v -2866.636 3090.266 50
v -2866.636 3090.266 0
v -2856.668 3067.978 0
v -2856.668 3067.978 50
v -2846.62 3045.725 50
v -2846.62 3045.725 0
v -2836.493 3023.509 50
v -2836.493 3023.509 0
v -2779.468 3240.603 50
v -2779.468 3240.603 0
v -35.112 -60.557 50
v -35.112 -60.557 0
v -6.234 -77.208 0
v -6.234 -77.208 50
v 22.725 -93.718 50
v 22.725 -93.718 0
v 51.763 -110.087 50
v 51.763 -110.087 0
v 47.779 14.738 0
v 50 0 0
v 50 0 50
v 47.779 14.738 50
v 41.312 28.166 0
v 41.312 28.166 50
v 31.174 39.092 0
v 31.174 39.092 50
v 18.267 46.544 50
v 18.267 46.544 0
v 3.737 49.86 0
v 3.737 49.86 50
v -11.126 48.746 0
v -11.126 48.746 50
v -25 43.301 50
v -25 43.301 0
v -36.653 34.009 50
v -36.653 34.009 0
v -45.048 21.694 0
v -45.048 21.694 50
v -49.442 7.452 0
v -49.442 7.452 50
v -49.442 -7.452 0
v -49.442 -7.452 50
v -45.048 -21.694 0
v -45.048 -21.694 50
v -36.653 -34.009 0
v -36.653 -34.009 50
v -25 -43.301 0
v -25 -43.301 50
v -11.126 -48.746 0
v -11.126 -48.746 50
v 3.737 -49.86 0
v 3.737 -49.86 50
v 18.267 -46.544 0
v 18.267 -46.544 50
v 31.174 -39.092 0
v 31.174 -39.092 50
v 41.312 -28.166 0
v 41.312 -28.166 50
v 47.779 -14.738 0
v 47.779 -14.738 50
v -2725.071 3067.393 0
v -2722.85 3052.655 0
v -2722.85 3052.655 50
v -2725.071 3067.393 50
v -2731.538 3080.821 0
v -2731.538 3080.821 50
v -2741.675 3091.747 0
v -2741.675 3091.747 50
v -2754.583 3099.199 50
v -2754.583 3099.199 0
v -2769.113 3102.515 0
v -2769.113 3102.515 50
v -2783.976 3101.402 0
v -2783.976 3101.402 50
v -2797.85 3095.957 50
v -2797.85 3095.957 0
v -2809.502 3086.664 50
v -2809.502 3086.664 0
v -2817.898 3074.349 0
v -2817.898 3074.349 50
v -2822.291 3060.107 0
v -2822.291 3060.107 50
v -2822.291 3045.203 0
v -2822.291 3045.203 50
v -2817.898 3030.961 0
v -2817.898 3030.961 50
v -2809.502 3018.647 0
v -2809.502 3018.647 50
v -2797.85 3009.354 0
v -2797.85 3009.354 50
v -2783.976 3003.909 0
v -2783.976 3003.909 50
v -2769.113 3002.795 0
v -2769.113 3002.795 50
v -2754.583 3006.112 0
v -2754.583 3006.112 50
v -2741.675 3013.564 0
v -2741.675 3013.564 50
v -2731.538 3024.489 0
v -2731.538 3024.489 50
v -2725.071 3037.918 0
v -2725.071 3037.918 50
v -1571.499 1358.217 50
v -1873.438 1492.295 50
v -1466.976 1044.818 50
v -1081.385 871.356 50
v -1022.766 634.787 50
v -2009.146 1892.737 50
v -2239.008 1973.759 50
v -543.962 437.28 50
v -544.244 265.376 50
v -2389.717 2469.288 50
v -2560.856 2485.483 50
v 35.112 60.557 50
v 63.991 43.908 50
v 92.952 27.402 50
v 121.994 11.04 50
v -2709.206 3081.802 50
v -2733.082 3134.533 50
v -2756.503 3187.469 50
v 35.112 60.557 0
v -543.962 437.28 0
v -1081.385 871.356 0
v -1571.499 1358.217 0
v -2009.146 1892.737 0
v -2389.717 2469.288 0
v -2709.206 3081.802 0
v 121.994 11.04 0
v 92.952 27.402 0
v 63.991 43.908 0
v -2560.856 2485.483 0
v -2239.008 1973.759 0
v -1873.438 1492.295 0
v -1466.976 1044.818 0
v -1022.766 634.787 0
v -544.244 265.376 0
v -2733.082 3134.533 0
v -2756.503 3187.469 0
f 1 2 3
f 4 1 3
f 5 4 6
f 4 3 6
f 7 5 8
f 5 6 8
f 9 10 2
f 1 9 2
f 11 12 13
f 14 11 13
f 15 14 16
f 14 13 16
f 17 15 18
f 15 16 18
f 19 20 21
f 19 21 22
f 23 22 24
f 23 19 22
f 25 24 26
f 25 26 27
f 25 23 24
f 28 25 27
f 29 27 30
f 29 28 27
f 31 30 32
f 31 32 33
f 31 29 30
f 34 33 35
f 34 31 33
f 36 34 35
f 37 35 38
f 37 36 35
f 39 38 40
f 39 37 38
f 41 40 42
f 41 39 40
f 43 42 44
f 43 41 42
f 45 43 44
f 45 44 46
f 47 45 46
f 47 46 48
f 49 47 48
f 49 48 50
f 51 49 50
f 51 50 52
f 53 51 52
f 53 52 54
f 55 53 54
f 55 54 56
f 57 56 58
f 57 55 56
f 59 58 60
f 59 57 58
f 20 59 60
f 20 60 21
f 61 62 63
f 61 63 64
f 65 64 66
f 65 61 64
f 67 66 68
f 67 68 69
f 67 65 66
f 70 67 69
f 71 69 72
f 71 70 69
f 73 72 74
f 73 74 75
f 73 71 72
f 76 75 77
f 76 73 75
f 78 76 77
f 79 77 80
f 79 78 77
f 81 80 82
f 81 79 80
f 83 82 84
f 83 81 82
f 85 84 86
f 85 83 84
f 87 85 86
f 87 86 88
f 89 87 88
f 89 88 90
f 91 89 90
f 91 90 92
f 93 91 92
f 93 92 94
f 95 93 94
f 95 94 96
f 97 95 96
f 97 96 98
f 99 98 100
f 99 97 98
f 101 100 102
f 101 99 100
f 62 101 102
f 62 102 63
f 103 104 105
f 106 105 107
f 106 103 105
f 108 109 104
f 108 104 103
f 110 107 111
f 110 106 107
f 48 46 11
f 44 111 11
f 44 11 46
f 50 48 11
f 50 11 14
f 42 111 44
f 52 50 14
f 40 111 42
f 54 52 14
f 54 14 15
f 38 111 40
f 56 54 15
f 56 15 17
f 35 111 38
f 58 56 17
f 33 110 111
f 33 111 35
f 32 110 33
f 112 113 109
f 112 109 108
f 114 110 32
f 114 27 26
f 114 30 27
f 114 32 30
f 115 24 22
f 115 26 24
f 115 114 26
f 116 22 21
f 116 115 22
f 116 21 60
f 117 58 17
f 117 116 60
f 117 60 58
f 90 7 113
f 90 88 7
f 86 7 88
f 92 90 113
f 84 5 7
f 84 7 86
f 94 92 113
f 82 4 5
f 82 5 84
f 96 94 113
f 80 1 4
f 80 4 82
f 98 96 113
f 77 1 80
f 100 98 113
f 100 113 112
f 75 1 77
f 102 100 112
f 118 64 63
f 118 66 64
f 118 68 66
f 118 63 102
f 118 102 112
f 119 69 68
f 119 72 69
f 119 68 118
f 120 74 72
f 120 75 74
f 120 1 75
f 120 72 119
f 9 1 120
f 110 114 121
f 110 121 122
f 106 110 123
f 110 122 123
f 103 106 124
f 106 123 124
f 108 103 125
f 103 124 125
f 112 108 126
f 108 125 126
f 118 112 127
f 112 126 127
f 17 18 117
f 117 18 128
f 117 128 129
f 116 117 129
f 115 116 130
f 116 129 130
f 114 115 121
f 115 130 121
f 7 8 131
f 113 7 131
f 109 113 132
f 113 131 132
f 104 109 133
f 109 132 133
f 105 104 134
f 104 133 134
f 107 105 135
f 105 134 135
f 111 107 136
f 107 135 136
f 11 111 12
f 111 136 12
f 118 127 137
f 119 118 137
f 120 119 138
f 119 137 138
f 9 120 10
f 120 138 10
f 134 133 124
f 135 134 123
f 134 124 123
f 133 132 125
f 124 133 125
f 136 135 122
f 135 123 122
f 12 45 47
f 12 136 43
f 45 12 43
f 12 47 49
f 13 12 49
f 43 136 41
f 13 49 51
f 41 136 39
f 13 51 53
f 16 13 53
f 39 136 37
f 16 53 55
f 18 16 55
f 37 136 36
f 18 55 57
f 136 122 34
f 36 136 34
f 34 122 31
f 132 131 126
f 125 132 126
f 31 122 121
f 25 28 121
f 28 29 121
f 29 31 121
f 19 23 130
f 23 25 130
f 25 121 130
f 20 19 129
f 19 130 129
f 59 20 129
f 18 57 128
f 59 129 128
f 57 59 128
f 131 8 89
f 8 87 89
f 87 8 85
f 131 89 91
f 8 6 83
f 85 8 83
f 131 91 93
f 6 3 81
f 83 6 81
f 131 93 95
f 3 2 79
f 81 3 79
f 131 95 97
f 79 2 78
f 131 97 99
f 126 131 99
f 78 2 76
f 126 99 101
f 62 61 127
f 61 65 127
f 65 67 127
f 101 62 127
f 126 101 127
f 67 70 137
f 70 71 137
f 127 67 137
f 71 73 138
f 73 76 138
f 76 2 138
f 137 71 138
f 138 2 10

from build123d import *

# Parameters (mm, degrees)
SKETCH1_R           = 50
BOSS_EXTRUDE1_DEPTH = 50


with BuildPart() as part:
    # Sketch1 → Boss-Extrude1 (new body)
    with BuildSketch(Plane.XY):
        with BuildLine():
            Line((51.763184367, -110.08745726), (121.994454448, 11.039769792))
            ThreePointArc((121.994454448, 11.039769792), (78.46121296, 35.637111971), (35.111840631, 60.557069344))
            ThreePointArc((35.111840631, 60.557069344), (-1571.499313179, 1358.21707482), (-2709.206276596, 3081.801640413))
            ThreePointArc((-2709.206276596, 3081.801640413), (-2744.849339403, 3160.975804045), (-2779.468441107, 3240.603022447))
            Line((-2779.468441107, 3240.603022447), (-2866.636082239, 3090.265791655))
            ThreePointArc((-2866.636082239, 3090.265791655), (-2851.653572761, 3056.847211293), (-2836.493201427, 3023.508941323))
            ThreePointArc((-2836.493201427, 3023.508941323), (-1675.129633057, 1264.085481813), (-35.111840631, -60.557069343))
            ThreePointArc((-35.111840631, -60.557069343), (8.235586311, -85.480271048), (51.763184367, -110.08745726))
        make_face()
        with Locations((-2772.849739011, 3052.655290868)):
            Circle(SKETCH1_R, mode=Mode.SUBTRACT)
        Circle(SKETCH1_R, mode=Mode.SUBTRACT)
    extrude(amount=BOSS_EXTRUDE1_DEPTH)


solid = part.part
